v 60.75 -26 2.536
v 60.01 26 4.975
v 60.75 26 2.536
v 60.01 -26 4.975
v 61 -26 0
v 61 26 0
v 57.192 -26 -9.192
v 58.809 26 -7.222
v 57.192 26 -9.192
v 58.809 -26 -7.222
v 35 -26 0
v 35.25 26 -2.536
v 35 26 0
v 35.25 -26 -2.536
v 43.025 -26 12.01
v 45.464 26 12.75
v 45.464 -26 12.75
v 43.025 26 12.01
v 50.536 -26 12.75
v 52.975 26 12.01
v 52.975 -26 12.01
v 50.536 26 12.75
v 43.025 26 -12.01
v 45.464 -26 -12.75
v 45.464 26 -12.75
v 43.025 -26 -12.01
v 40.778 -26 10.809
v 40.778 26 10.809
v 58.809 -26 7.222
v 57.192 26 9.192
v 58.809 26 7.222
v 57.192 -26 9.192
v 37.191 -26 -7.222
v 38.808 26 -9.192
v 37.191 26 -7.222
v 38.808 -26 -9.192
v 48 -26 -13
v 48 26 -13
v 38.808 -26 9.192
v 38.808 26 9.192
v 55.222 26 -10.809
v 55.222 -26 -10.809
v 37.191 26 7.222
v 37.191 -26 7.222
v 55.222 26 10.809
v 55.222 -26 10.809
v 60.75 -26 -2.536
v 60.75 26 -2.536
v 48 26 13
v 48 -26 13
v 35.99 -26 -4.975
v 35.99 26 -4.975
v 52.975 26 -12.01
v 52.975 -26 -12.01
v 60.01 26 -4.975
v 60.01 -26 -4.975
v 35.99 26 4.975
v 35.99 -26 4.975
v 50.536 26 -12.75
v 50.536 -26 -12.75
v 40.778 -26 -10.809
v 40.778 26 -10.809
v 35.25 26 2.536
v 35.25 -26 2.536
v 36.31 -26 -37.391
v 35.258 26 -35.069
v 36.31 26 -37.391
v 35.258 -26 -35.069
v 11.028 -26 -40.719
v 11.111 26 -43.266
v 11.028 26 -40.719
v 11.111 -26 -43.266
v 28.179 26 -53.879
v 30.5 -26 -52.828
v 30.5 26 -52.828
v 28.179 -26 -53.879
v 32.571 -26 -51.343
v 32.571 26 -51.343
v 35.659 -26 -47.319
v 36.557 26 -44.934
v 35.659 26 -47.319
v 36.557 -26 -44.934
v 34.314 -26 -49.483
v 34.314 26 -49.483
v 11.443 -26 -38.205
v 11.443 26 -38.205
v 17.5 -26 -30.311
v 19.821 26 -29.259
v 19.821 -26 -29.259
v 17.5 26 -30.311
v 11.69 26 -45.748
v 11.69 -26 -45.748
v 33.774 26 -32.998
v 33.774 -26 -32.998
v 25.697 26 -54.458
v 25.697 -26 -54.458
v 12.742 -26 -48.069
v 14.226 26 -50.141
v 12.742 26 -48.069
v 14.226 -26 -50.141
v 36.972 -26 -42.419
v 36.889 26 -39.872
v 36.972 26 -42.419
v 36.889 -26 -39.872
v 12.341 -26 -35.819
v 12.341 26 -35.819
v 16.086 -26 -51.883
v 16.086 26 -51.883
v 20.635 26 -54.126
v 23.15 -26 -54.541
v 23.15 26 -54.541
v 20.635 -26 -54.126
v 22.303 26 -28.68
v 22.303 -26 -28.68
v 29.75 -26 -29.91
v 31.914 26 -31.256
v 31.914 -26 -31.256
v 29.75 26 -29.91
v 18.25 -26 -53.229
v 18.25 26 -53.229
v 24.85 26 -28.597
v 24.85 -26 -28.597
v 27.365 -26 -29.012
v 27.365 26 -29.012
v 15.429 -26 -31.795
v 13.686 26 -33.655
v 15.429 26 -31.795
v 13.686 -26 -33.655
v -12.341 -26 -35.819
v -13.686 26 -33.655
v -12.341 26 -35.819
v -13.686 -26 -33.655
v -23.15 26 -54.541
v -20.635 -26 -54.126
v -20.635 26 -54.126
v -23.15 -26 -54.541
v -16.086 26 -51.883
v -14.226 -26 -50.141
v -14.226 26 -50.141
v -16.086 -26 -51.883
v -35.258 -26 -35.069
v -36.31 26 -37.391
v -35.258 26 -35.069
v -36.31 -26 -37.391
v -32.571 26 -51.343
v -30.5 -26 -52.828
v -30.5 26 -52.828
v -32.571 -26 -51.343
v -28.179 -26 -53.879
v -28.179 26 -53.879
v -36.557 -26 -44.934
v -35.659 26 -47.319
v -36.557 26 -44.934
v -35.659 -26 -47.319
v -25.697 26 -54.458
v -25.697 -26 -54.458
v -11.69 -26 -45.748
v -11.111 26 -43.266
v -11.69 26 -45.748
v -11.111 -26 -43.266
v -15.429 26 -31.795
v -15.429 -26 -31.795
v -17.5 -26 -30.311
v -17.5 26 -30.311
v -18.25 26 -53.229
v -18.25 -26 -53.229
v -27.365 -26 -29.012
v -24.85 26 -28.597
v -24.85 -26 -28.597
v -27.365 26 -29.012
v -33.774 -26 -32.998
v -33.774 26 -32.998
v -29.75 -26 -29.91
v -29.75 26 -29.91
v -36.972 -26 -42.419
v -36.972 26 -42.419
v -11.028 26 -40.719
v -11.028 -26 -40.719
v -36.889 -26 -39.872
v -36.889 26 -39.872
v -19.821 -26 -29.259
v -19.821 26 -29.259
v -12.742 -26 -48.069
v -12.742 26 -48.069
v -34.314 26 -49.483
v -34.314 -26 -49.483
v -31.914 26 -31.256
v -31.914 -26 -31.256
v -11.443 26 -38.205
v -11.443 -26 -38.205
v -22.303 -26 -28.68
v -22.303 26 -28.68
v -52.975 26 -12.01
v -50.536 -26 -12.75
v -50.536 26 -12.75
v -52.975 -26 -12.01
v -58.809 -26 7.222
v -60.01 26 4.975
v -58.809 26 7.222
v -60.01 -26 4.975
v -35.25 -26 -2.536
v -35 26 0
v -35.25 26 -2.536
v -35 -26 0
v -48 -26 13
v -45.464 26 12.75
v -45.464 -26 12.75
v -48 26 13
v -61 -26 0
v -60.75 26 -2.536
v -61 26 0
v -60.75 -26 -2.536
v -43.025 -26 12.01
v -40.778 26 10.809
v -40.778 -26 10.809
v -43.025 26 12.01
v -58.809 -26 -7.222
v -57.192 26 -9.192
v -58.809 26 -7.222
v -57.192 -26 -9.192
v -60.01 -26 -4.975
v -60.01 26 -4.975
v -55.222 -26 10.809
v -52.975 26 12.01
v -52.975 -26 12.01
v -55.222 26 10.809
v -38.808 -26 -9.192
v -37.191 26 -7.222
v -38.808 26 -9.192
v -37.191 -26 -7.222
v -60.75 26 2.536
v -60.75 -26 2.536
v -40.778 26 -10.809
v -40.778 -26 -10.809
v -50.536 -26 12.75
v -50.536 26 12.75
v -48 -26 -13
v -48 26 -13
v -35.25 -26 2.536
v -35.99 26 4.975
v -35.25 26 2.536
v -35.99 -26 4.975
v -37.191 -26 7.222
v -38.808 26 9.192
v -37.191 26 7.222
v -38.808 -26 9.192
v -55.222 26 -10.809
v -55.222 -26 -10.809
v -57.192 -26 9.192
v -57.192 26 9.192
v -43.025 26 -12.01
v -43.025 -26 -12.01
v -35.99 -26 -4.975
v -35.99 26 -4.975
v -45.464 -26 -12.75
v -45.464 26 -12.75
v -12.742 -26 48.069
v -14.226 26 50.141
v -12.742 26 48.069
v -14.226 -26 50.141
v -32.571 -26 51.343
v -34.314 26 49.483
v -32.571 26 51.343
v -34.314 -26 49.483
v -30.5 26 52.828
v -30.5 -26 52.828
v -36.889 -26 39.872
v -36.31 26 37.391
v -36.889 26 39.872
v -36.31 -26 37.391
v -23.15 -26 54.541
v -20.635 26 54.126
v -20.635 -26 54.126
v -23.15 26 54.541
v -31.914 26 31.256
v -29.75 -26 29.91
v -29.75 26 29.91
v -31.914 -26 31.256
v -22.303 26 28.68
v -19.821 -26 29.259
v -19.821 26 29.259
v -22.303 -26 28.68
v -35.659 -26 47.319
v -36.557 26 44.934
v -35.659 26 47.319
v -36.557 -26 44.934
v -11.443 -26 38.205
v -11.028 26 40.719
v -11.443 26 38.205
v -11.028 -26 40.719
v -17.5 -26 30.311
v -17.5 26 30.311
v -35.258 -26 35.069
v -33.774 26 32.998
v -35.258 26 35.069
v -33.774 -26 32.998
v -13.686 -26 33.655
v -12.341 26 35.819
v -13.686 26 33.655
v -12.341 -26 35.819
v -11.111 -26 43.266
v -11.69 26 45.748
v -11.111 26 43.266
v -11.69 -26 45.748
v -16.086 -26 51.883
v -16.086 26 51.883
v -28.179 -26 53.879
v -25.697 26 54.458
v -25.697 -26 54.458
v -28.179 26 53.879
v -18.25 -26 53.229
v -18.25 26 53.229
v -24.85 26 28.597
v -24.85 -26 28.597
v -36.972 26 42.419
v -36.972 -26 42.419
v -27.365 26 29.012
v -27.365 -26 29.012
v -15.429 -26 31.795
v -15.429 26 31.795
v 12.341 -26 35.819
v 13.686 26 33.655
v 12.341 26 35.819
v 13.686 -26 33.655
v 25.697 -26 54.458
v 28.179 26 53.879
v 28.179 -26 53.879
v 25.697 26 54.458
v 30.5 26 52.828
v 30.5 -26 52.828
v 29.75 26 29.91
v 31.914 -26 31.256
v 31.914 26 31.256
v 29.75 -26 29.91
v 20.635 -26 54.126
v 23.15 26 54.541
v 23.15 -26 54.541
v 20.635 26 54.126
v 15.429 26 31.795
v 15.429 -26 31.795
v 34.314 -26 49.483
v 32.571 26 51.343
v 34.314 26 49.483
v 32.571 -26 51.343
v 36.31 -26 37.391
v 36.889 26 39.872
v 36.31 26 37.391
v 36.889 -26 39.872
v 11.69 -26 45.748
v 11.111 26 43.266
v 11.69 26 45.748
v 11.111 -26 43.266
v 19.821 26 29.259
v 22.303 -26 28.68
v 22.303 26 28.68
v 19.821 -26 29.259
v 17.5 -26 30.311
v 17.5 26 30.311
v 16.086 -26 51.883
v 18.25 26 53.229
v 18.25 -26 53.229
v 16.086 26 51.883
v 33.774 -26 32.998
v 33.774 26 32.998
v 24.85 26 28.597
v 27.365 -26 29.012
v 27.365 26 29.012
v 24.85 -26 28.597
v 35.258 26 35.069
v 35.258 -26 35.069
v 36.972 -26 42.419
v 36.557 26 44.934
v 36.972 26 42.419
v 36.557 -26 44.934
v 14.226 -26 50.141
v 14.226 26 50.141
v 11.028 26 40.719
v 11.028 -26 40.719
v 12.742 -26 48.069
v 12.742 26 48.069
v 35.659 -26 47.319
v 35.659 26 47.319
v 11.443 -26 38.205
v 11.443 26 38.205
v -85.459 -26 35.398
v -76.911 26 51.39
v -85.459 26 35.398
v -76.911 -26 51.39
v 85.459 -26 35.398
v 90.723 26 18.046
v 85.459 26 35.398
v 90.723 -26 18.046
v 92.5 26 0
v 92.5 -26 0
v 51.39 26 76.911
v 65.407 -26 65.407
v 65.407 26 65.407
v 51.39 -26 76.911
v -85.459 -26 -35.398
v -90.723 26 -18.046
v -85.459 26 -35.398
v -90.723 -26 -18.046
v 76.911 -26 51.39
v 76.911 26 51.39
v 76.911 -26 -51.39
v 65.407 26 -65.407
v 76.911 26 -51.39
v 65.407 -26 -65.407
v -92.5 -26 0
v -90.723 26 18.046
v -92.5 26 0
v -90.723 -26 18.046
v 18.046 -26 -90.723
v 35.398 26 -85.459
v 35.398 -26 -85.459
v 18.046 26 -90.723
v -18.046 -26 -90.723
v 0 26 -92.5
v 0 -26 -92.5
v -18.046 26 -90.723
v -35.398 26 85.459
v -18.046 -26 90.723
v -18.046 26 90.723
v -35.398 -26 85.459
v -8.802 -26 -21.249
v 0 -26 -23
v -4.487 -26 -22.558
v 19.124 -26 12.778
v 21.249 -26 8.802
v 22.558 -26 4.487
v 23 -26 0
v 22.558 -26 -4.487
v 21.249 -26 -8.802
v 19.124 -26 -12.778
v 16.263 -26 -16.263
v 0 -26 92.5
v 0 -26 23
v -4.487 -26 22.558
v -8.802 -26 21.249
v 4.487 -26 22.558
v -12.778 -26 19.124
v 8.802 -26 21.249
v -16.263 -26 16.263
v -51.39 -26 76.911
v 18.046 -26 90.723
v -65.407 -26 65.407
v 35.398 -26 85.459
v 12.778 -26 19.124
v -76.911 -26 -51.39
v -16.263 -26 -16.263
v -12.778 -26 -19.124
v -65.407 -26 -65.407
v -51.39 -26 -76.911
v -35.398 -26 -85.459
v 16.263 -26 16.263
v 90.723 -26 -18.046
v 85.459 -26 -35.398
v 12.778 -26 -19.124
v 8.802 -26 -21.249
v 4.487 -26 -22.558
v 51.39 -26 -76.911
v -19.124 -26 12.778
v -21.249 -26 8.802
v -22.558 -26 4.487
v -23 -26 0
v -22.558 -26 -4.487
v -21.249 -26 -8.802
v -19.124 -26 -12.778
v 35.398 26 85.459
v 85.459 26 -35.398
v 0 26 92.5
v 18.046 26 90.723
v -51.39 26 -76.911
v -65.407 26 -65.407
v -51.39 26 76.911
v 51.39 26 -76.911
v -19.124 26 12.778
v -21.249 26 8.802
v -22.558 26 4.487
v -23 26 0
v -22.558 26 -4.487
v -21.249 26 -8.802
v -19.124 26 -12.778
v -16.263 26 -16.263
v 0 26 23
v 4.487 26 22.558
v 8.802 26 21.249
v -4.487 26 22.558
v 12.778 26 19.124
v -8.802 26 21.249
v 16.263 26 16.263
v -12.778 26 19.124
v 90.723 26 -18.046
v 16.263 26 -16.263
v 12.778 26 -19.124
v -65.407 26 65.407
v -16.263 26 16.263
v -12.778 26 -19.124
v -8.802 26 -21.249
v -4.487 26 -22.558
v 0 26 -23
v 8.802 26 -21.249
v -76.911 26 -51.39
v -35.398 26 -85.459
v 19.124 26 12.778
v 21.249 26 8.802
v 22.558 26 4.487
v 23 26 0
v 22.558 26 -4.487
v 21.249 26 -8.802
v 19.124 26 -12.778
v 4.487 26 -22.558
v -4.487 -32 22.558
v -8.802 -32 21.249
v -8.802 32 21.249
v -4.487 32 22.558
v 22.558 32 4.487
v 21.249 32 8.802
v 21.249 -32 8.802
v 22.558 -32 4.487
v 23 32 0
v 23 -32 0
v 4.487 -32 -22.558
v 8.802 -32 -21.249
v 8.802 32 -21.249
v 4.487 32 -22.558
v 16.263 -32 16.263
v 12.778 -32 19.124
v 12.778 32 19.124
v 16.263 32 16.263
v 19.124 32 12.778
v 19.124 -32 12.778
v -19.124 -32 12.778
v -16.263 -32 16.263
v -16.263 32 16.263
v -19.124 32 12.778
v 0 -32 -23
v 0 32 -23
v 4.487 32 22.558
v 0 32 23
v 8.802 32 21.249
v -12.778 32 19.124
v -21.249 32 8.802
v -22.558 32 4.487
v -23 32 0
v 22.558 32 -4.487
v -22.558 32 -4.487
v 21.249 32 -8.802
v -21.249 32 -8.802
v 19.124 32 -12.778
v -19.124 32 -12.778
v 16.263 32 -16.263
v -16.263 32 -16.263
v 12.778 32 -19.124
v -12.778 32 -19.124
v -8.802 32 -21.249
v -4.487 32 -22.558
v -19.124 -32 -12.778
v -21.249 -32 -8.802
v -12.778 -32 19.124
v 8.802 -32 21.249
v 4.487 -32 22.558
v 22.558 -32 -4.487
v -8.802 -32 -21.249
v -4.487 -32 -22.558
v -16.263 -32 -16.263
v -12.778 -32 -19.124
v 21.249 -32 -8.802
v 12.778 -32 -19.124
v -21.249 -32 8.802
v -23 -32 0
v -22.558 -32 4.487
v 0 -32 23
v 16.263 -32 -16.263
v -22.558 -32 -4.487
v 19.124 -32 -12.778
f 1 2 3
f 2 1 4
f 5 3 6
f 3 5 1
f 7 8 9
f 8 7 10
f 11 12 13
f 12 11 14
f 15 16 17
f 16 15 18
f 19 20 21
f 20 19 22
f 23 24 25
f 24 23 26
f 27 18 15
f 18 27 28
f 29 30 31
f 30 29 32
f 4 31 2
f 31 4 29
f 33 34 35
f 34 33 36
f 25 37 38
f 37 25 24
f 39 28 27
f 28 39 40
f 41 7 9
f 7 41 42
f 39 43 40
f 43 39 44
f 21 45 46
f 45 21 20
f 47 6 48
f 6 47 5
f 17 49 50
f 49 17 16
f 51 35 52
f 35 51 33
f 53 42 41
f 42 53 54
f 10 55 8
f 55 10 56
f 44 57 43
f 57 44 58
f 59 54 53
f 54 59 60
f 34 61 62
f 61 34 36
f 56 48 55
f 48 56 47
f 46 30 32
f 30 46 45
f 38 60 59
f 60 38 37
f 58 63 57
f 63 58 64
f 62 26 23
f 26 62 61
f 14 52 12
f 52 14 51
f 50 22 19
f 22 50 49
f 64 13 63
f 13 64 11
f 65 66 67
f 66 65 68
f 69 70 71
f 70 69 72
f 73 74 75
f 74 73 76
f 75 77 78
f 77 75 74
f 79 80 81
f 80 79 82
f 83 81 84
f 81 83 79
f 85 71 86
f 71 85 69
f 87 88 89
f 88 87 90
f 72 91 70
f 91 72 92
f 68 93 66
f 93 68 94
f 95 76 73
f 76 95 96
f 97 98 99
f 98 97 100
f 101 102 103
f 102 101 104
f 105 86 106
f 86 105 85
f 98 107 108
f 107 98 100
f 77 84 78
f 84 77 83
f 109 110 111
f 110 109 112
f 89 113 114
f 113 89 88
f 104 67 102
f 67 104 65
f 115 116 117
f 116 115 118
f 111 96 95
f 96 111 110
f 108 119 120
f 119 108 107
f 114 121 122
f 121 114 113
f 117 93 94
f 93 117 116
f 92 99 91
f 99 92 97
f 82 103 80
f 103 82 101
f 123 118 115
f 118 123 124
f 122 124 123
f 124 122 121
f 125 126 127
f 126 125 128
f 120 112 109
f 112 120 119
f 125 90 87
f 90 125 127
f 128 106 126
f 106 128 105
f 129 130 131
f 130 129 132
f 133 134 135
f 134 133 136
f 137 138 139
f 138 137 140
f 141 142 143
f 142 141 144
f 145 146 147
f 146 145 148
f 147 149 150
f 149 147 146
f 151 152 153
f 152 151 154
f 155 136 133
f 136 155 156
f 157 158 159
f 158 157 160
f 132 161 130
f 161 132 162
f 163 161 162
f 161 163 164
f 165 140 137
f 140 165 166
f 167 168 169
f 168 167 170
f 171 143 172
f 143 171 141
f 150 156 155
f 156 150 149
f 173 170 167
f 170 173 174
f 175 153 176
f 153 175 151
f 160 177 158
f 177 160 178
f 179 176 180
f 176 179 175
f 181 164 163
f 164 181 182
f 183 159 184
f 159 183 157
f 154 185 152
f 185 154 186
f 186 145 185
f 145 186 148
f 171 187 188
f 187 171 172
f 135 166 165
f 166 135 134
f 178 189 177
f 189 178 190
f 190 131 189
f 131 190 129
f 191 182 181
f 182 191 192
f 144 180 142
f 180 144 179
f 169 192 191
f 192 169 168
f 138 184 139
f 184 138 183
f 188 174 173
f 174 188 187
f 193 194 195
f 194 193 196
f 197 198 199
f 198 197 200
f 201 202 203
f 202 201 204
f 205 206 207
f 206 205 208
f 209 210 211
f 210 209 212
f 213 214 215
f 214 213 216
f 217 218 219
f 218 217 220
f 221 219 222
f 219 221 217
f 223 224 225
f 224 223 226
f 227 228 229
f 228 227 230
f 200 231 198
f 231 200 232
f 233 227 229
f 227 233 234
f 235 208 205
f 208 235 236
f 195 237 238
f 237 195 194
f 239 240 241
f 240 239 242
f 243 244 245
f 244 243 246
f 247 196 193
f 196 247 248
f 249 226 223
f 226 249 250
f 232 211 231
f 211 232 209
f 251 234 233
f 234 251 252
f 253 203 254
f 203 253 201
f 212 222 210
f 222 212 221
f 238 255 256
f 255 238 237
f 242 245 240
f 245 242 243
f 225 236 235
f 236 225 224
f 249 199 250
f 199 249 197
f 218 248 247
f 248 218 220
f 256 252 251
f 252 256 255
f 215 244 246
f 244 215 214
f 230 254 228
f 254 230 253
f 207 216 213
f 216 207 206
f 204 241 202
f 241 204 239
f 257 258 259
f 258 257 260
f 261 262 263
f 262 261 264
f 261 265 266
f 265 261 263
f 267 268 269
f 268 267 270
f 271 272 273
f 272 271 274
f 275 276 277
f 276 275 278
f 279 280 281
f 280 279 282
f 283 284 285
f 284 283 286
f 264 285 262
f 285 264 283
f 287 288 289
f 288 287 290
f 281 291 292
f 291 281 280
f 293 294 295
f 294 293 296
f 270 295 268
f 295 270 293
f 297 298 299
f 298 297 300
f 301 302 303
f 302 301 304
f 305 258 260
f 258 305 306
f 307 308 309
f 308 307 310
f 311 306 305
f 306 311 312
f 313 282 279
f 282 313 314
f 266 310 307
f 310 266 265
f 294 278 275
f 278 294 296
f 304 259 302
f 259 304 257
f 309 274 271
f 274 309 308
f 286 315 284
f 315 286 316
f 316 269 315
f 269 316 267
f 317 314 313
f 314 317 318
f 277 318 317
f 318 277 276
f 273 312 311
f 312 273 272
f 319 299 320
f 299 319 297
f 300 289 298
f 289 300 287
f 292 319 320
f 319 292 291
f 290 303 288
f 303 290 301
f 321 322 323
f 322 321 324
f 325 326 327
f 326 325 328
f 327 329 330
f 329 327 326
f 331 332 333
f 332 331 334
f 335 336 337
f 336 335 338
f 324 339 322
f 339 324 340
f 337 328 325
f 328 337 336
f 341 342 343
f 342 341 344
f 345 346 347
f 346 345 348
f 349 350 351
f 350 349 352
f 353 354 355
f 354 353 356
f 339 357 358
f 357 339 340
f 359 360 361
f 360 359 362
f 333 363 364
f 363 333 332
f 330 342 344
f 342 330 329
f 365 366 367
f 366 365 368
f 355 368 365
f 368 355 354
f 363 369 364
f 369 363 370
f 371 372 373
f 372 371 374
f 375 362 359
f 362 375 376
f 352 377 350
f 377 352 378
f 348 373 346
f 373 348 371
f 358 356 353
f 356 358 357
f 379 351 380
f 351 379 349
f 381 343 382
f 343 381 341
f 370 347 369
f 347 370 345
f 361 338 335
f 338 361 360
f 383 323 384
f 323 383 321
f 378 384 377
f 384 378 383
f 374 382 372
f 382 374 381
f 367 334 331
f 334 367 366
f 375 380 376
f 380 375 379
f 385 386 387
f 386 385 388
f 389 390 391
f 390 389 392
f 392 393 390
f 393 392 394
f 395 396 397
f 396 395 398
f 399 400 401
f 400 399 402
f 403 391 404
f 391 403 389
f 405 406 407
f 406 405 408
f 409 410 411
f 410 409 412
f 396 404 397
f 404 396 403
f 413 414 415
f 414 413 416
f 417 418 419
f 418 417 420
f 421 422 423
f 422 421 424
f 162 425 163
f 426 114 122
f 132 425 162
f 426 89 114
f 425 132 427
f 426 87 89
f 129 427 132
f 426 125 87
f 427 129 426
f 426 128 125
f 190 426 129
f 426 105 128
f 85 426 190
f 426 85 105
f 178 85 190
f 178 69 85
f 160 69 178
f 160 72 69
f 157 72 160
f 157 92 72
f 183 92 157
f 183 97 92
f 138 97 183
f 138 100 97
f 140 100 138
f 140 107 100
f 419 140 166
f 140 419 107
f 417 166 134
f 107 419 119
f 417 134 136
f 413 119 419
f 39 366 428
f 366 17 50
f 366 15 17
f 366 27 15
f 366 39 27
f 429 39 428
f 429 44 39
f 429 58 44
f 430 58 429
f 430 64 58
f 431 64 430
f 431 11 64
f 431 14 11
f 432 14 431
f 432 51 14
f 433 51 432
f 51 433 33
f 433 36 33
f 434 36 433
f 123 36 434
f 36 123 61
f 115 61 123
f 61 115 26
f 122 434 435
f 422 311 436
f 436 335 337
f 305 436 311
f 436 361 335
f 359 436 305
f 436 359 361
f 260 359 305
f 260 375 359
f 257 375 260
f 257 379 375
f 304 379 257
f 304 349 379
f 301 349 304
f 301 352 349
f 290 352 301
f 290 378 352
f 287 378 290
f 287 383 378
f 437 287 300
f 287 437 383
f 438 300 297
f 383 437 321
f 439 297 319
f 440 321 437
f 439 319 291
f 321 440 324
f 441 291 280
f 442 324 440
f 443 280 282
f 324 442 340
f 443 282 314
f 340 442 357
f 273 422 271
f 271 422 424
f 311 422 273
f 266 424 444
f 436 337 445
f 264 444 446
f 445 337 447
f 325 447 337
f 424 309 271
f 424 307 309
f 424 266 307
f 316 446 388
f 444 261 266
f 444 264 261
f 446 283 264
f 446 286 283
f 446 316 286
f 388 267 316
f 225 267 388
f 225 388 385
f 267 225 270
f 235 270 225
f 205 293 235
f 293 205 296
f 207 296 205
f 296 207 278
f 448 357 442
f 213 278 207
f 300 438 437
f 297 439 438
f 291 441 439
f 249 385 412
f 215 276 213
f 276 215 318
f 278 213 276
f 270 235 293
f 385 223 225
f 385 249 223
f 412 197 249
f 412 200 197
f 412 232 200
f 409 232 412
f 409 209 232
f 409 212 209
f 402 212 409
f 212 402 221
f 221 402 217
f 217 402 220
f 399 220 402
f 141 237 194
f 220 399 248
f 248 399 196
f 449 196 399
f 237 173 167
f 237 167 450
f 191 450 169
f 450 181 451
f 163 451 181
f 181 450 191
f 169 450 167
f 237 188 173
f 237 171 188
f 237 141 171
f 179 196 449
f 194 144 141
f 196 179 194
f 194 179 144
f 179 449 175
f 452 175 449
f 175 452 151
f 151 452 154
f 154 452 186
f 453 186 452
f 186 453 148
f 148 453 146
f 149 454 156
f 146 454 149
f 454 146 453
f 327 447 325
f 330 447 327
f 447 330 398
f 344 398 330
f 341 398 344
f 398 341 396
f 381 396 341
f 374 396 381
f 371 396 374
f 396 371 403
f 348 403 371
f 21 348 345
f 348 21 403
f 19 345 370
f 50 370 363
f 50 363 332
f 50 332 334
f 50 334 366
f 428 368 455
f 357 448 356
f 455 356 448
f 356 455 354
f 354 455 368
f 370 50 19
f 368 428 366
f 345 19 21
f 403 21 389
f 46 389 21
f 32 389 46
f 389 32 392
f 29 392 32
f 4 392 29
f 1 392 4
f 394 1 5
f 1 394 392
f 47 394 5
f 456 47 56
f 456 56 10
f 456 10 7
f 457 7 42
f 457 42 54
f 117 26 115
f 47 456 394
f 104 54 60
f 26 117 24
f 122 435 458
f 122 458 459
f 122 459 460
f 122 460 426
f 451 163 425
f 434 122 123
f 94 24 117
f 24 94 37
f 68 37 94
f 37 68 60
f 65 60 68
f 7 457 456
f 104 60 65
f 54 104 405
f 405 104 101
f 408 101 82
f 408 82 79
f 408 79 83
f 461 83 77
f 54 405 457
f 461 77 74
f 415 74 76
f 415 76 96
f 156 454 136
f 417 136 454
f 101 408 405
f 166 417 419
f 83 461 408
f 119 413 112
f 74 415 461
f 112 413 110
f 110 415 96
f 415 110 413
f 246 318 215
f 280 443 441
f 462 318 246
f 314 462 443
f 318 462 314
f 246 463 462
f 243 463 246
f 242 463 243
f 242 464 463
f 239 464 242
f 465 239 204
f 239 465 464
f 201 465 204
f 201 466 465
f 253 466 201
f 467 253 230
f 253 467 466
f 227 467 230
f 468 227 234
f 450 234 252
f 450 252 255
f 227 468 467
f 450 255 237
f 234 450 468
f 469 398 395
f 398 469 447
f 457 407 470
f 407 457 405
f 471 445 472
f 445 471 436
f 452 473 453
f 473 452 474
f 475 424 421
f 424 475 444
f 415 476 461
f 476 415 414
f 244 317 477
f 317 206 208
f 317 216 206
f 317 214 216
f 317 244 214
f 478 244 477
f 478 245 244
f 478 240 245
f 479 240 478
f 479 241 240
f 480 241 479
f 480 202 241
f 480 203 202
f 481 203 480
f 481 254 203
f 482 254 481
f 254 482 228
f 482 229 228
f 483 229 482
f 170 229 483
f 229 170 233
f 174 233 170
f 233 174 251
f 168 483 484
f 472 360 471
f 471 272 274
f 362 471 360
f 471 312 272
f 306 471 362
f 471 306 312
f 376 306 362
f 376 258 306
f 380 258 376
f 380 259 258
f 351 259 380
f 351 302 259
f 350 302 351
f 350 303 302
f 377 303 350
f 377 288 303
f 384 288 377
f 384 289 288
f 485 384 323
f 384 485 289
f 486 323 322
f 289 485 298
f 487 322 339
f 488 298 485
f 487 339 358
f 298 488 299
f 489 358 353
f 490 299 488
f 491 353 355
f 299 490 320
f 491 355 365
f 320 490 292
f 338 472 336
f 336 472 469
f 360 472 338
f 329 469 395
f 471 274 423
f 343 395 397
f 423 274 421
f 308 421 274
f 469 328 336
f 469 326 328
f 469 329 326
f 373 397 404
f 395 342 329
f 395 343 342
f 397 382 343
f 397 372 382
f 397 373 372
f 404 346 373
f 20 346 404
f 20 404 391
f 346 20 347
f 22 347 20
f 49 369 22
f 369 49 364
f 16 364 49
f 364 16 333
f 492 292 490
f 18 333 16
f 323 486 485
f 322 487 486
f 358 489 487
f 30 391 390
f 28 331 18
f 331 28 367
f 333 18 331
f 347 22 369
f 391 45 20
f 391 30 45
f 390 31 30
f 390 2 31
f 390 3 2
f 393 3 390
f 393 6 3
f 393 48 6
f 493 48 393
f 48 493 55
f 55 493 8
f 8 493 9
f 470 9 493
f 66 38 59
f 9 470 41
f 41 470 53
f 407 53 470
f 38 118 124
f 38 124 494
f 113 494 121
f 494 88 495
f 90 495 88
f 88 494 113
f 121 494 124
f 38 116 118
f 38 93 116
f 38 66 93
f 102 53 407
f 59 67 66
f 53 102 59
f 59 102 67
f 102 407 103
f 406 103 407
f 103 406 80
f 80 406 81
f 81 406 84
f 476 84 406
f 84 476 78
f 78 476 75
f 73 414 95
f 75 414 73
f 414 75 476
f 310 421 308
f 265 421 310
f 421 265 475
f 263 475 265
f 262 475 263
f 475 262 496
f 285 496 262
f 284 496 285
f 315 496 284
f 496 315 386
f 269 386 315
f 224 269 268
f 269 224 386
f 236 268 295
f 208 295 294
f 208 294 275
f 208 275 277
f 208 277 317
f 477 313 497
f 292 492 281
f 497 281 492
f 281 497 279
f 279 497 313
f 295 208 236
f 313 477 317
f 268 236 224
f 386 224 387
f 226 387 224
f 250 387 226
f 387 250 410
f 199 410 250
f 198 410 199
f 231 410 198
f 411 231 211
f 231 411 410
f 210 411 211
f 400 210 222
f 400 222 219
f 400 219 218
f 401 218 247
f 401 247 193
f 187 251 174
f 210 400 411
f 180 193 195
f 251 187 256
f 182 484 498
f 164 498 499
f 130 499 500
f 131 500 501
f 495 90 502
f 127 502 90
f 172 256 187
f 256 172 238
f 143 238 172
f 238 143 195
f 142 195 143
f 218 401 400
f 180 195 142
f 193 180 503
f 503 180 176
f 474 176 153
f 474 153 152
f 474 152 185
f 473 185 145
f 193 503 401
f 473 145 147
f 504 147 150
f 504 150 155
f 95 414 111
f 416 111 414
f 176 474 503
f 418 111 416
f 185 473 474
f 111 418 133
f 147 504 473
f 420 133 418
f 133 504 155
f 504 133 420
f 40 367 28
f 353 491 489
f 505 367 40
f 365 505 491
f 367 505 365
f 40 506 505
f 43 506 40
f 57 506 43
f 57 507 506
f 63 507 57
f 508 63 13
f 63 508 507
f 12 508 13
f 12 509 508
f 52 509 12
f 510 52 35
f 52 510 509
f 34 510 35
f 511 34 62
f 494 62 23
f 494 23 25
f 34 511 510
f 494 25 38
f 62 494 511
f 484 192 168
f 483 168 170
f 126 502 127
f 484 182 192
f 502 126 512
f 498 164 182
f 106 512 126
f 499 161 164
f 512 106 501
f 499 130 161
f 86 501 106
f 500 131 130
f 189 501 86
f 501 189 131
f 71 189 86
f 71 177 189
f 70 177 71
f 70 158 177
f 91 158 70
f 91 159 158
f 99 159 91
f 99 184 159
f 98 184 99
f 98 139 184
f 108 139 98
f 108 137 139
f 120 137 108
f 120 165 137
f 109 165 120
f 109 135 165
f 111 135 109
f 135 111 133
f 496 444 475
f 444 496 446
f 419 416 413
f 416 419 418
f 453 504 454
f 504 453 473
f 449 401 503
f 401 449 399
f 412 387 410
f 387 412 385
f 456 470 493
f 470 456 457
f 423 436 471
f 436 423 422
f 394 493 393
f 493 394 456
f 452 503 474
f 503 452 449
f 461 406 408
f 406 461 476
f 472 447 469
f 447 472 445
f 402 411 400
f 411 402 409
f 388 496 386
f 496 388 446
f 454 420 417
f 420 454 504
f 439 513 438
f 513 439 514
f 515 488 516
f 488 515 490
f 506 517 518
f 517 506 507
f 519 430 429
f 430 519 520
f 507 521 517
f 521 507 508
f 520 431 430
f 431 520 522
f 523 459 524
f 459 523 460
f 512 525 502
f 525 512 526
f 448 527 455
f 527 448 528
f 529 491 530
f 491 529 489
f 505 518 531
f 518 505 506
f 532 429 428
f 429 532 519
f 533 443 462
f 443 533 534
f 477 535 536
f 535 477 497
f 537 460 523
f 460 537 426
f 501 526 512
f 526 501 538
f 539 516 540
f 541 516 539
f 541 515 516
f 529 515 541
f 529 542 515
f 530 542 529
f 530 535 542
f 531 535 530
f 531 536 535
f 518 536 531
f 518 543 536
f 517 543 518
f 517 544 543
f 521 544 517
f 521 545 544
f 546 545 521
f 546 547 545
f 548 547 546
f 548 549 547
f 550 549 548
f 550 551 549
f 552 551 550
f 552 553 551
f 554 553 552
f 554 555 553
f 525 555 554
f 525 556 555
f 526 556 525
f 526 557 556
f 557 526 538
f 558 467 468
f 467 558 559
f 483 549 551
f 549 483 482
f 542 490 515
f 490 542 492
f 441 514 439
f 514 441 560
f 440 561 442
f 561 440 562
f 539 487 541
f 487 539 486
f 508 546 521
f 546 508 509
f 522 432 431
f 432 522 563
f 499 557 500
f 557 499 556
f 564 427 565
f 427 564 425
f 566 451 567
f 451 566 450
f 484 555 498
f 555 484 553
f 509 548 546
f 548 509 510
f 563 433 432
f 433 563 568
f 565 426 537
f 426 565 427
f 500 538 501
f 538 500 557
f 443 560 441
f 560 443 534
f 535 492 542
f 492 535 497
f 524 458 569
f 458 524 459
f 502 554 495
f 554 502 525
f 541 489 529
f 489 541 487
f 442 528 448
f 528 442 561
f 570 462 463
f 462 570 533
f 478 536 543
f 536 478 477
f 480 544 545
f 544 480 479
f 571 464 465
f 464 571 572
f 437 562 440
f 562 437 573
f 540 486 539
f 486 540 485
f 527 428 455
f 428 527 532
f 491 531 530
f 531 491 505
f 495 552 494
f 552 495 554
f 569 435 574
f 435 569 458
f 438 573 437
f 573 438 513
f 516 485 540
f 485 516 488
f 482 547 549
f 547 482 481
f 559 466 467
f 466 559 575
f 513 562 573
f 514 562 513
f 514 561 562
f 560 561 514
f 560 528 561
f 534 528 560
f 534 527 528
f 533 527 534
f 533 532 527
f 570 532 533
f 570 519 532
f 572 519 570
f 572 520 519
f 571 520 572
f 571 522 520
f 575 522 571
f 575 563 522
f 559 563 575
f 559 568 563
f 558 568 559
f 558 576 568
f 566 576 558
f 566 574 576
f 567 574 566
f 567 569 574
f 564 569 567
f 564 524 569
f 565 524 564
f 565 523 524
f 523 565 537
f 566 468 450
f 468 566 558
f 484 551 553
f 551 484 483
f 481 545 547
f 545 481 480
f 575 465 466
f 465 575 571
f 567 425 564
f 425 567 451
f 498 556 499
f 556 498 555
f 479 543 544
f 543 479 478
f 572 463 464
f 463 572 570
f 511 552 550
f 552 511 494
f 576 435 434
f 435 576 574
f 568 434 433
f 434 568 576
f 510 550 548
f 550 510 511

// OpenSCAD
use <main.scad>
drive_wheel_diameter = 220;
drive_wheel_radius   = 110;
drive_wheel_width    = 60;
drive_wheel_track    = 620;
drive_wheel_axle_z   = 110;
show_component_labels = false;
translate([0, -drive_wheel_track / 2, -drive_wheel_axle_z])
    drive_wheel_hub(1, 0);
